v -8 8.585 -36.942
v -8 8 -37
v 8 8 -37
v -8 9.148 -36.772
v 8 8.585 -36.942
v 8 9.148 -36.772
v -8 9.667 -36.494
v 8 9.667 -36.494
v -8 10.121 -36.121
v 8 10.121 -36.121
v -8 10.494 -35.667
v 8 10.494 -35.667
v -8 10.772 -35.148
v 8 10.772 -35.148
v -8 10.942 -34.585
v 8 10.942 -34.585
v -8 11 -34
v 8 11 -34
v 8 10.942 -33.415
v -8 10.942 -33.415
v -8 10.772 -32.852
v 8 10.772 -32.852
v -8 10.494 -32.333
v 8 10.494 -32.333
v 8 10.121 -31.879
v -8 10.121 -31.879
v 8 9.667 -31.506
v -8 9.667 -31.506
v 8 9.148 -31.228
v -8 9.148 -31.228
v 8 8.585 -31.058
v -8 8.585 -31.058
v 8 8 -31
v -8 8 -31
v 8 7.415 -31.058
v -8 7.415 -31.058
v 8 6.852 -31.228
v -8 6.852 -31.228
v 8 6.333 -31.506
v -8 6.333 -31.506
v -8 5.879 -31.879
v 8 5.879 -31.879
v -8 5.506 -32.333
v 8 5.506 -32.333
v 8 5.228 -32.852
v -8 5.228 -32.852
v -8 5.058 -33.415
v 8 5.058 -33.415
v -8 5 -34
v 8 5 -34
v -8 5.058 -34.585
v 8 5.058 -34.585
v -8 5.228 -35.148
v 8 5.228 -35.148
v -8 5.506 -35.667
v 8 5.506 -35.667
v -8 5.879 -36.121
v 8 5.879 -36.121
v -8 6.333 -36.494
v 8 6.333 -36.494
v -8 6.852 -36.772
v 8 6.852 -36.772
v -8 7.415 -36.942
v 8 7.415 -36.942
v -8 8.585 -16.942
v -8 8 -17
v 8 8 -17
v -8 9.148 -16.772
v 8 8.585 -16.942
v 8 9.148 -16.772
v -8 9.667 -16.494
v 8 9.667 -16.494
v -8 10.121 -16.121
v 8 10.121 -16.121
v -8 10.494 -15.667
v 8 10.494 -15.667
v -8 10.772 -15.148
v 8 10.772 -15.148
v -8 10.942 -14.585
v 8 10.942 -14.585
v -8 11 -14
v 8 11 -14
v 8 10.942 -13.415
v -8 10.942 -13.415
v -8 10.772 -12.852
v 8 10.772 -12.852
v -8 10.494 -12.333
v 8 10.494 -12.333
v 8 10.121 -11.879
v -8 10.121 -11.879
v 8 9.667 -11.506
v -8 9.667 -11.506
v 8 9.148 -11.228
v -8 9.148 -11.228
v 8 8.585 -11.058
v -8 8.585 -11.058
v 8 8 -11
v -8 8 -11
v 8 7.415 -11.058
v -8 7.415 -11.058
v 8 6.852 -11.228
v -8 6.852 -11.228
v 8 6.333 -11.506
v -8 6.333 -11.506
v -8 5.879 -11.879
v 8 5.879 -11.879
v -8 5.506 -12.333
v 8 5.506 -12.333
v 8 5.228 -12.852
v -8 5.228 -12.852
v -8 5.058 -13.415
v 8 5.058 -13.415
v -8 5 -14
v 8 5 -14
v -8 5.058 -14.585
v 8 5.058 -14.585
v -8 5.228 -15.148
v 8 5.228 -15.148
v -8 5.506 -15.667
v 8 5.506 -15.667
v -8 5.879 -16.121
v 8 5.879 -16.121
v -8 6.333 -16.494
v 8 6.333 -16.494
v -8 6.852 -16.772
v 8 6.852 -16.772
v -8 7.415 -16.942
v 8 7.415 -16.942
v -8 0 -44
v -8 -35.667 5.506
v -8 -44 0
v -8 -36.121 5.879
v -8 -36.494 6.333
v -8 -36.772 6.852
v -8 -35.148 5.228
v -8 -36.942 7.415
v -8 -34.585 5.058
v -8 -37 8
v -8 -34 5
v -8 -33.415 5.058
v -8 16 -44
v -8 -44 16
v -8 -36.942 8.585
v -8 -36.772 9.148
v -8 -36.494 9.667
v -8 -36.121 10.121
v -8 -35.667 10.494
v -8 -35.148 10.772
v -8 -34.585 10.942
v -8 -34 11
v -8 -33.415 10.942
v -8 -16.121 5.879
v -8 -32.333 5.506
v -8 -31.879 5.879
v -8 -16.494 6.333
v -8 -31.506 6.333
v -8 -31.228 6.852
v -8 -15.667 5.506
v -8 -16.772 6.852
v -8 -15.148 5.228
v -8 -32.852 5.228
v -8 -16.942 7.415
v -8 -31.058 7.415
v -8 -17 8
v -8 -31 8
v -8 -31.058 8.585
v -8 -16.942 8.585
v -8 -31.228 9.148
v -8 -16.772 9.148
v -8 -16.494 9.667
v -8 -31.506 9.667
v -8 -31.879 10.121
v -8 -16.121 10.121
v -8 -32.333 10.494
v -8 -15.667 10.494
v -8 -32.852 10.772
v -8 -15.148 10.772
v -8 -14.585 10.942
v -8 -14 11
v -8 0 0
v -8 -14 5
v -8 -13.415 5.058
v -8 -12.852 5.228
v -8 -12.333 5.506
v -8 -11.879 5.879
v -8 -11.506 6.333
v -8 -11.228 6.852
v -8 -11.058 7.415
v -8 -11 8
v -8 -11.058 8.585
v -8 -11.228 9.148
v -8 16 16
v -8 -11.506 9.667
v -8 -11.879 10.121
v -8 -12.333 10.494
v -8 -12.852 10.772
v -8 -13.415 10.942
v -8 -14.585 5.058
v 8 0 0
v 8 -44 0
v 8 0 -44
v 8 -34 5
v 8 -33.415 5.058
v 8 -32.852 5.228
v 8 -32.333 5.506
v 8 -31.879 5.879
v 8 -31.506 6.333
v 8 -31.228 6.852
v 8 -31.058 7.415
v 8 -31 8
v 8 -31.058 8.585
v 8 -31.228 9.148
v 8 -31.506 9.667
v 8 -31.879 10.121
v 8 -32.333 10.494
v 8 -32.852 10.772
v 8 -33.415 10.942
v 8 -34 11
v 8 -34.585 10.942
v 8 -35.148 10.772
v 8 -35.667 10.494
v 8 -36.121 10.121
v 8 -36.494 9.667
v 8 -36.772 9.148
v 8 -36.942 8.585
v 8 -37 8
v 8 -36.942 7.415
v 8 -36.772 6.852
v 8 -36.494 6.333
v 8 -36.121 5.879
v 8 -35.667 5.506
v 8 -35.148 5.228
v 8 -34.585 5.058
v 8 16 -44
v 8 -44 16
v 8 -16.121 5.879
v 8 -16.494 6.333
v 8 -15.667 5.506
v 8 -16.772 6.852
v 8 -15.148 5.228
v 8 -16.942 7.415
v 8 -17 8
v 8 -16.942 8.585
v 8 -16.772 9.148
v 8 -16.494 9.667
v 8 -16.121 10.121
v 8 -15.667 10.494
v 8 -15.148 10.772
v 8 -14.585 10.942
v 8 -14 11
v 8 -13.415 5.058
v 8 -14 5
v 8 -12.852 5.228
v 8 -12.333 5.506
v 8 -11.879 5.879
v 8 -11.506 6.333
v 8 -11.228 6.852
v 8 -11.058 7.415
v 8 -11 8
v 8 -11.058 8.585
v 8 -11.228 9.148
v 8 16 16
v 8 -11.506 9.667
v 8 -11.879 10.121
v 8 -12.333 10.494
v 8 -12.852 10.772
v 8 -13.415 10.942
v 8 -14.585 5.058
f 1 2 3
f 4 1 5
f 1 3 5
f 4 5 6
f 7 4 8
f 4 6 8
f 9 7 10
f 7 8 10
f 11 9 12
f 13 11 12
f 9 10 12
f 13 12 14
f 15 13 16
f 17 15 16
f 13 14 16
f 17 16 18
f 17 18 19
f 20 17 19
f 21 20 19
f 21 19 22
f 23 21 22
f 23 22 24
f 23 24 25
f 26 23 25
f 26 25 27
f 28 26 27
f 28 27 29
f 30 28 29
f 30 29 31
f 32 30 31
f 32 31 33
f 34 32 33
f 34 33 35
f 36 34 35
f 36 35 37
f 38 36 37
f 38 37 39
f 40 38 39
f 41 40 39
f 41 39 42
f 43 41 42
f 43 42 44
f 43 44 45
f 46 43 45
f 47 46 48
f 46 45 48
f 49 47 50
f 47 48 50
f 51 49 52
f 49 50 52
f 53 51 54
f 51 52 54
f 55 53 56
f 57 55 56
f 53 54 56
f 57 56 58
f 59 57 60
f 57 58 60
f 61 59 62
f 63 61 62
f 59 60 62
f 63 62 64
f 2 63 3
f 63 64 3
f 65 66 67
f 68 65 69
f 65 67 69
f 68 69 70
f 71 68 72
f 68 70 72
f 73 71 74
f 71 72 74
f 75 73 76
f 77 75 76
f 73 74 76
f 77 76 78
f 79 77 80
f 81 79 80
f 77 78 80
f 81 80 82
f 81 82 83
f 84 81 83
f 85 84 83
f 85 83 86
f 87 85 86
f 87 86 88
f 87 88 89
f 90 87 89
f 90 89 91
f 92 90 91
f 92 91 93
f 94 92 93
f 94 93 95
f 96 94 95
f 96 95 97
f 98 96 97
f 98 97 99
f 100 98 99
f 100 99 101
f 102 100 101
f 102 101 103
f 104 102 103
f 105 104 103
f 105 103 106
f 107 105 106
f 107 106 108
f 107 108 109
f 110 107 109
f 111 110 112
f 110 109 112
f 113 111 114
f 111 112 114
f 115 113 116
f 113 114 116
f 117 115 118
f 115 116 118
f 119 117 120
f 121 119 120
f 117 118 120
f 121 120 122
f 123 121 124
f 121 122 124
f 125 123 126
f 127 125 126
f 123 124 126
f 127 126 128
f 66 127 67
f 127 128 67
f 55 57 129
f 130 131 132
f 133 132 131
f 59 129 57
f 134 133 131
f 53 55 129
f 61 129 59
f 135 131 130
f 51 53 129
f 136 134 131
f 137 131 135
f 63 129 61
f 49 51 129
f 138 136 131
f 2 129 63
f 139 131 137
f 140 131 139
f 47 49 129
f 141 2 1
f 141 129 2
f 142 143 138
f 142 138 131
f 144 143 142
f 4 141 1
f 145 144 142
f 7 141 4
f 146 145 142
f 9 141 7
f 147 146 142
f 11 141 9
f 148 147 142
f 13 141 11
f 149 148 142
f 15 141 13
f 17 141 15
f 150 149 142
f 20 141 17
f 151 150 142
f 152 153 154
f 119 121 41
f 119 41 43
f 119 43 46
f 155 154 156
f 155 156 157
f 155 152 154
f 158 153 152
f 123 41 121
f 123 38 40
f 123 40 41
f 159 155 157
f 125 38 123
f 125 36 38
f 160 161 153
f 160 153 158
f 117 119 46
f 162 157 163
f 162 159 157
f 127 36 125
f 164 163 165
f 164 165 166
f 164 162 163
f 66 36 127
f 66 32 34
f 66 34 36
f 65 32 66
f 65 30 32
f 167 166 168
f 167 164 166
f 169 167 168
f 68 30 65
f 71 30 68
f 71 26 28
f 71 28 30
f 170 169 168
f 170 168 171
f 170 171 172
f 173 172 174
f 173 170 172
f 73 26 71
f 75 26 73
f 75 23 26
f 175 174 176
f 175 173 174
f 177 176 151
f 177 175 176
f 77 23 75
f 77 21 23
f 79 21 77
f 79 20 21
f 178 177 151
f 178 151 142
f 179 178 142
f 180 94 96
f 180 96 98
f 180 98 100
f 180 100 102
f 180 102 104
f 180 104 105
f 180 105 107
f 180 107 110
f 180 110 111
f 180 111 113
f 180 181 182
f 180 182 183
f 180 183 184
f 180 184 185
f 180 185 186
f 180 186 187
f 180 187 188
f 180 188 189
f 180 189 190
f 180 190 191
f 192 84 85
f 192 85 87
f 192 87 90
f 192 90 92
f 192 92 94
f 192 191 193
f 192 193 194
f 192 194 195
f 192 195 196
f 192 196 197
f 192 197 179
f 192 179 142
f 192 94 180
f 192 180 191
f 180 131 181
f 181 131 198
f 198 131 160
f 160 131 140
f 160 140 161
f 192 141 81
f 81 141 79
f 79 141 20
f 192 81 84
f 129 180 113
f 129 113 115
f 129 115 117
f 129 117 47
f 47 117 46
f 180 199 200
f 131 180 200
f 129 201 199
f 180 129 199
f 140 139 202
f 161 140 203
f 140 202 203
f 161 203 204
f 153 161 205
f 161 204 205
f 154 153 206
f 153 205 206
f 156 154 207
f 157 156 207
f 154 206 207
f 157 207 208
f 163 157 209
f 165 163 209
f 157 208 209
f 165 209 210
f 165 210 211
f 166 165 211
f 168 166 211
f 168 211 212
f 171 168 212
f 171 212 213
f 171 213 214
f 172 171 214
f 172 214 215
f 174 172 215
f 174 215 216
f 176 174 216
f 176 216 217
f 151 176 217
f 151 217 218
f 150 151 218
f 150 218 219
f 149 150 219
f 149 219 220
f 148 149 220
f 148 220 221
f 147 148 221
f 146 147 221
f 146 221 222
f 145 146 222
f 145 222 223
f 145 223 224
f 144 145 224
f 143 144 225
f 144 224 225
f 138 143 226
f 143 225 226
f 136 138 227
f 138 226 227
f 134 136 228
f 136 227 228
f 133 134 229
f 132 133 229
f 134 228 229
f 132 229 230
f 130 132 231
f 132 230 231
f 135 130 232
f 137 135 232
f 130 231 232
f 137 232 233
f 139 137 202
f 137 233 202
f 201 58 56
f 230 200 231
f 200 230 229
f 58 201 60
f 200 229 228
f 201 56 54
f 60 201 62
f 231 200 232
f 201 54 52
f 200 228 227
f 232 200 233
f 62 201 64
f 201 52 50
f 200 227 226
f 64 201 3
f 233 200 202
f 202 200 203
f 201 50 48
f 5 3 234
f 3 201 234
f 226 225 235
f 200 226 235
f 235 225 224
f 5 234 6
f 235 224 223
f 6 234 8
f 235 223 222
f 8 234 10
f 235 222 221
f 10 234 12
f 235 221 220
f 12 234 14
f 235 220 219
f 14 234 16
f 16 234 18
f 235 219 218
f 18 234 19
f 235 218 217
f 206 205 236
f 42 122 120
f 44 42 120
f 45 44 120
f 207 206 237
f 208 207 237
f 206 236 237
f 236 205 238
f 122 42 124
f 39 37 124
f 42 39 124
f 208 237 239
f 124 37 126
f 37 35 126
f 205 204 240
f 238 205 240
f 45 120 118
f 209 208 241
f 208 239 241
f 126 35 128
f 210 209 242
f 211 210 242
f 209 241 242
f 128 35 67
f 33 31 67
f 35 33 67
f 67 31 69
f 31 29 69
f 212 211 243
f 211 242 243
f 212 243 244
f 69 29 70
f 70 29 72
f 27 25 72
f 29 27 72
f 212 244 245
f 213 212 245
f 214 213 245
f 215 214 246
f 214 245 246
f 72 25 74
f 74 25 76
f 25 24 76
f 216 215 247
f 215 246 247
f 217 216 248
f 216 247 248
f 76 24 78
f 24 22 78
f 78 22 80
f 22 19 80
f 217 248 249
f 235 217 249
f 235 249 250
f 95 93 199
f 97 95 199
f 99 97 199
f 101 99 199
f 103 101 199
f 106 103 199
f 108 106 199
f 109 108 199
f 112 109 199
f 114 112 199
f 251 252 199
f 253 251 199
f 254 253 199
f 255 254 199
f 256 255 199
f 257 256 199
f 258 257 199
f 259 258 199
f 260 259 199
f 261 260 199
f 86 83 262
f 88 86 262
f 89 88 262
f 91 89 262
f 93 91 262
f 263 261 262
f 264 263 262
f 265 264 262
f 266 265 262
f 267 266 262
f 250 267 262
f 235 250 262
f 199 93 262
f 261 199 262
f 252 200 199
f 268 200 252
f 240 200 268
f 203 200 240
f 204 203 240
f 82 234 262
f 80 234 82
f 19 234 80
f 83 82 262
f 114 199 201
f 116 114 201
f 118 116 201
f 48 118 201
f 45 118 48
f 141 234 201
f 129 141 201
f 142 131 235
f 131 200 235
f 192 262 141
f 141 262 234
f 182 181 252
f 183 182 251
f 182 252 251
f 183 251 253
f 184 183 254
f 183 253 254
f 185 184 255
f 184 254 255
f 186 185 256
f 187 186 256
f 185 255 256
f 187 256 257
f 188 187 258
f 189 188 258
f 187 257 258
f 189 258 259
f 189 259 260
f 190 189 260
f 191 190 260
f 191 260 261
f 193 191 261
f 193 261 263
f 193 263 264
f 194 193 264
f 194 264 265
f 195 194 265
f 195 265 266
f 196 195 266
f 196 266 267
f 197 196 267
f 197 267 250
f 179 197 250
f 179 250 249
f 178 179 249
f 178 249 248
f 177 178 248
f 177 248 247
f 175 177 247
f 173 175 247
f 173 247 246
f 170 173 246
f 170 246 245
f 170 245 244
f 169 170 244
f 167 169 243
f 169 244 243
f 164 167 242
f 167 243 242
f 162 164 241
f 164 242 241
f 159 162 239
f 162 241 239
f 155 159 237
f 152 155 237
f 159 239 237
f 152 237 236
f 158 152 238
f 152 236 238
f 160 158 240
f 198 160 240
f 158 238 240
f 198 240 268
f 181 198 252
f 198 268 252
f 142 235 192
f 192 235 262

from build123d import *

# Parameters (mm, degrees)
BOSS_EXTRUDE1_DEPTH = 8
SKETCH2_R           = 3
CUT_EXTRUDE1_DEPTH  = 65.249513617


with BuildPart() as part:
    # Sketch1 → Boss-Extrude1 (new, symmetric)
    with BuildSketch(Plane(origin=(0, 0, 0), x_dir=(0, 0, -1), z_dir=(1, 0, 0))):
        Polygon((0, 0), (0, -44), (-16, -44), (-16, 16), (44, 16), (44, 0), align=None)
    extrude(amount=BOSS_EXTRUDE1_DEPTH, both=True)

    # Sketch2 → Cut-Extrude1 (cut, through all)
    with BuildSketch(Plane(origin=(8, 0, 0), x_dir=(0, 0, -1), z_dir=(1, 0, 0))):
        with Locations((-8, -34)):
            Circle(SKETCH2_R)
        with Locations((-8, -14)):
            Circle(SKETCH2_R)
        with Locations((14, 8)):
            Circle(SKETCH2_R)
        with Locations((34, 8)):
            Circle(SKETCH2_R)
    extrude(amount=-CUT_EXTRUDE1_DEPTH, mode=Mode.SUBTRACT)


solid = part.part
